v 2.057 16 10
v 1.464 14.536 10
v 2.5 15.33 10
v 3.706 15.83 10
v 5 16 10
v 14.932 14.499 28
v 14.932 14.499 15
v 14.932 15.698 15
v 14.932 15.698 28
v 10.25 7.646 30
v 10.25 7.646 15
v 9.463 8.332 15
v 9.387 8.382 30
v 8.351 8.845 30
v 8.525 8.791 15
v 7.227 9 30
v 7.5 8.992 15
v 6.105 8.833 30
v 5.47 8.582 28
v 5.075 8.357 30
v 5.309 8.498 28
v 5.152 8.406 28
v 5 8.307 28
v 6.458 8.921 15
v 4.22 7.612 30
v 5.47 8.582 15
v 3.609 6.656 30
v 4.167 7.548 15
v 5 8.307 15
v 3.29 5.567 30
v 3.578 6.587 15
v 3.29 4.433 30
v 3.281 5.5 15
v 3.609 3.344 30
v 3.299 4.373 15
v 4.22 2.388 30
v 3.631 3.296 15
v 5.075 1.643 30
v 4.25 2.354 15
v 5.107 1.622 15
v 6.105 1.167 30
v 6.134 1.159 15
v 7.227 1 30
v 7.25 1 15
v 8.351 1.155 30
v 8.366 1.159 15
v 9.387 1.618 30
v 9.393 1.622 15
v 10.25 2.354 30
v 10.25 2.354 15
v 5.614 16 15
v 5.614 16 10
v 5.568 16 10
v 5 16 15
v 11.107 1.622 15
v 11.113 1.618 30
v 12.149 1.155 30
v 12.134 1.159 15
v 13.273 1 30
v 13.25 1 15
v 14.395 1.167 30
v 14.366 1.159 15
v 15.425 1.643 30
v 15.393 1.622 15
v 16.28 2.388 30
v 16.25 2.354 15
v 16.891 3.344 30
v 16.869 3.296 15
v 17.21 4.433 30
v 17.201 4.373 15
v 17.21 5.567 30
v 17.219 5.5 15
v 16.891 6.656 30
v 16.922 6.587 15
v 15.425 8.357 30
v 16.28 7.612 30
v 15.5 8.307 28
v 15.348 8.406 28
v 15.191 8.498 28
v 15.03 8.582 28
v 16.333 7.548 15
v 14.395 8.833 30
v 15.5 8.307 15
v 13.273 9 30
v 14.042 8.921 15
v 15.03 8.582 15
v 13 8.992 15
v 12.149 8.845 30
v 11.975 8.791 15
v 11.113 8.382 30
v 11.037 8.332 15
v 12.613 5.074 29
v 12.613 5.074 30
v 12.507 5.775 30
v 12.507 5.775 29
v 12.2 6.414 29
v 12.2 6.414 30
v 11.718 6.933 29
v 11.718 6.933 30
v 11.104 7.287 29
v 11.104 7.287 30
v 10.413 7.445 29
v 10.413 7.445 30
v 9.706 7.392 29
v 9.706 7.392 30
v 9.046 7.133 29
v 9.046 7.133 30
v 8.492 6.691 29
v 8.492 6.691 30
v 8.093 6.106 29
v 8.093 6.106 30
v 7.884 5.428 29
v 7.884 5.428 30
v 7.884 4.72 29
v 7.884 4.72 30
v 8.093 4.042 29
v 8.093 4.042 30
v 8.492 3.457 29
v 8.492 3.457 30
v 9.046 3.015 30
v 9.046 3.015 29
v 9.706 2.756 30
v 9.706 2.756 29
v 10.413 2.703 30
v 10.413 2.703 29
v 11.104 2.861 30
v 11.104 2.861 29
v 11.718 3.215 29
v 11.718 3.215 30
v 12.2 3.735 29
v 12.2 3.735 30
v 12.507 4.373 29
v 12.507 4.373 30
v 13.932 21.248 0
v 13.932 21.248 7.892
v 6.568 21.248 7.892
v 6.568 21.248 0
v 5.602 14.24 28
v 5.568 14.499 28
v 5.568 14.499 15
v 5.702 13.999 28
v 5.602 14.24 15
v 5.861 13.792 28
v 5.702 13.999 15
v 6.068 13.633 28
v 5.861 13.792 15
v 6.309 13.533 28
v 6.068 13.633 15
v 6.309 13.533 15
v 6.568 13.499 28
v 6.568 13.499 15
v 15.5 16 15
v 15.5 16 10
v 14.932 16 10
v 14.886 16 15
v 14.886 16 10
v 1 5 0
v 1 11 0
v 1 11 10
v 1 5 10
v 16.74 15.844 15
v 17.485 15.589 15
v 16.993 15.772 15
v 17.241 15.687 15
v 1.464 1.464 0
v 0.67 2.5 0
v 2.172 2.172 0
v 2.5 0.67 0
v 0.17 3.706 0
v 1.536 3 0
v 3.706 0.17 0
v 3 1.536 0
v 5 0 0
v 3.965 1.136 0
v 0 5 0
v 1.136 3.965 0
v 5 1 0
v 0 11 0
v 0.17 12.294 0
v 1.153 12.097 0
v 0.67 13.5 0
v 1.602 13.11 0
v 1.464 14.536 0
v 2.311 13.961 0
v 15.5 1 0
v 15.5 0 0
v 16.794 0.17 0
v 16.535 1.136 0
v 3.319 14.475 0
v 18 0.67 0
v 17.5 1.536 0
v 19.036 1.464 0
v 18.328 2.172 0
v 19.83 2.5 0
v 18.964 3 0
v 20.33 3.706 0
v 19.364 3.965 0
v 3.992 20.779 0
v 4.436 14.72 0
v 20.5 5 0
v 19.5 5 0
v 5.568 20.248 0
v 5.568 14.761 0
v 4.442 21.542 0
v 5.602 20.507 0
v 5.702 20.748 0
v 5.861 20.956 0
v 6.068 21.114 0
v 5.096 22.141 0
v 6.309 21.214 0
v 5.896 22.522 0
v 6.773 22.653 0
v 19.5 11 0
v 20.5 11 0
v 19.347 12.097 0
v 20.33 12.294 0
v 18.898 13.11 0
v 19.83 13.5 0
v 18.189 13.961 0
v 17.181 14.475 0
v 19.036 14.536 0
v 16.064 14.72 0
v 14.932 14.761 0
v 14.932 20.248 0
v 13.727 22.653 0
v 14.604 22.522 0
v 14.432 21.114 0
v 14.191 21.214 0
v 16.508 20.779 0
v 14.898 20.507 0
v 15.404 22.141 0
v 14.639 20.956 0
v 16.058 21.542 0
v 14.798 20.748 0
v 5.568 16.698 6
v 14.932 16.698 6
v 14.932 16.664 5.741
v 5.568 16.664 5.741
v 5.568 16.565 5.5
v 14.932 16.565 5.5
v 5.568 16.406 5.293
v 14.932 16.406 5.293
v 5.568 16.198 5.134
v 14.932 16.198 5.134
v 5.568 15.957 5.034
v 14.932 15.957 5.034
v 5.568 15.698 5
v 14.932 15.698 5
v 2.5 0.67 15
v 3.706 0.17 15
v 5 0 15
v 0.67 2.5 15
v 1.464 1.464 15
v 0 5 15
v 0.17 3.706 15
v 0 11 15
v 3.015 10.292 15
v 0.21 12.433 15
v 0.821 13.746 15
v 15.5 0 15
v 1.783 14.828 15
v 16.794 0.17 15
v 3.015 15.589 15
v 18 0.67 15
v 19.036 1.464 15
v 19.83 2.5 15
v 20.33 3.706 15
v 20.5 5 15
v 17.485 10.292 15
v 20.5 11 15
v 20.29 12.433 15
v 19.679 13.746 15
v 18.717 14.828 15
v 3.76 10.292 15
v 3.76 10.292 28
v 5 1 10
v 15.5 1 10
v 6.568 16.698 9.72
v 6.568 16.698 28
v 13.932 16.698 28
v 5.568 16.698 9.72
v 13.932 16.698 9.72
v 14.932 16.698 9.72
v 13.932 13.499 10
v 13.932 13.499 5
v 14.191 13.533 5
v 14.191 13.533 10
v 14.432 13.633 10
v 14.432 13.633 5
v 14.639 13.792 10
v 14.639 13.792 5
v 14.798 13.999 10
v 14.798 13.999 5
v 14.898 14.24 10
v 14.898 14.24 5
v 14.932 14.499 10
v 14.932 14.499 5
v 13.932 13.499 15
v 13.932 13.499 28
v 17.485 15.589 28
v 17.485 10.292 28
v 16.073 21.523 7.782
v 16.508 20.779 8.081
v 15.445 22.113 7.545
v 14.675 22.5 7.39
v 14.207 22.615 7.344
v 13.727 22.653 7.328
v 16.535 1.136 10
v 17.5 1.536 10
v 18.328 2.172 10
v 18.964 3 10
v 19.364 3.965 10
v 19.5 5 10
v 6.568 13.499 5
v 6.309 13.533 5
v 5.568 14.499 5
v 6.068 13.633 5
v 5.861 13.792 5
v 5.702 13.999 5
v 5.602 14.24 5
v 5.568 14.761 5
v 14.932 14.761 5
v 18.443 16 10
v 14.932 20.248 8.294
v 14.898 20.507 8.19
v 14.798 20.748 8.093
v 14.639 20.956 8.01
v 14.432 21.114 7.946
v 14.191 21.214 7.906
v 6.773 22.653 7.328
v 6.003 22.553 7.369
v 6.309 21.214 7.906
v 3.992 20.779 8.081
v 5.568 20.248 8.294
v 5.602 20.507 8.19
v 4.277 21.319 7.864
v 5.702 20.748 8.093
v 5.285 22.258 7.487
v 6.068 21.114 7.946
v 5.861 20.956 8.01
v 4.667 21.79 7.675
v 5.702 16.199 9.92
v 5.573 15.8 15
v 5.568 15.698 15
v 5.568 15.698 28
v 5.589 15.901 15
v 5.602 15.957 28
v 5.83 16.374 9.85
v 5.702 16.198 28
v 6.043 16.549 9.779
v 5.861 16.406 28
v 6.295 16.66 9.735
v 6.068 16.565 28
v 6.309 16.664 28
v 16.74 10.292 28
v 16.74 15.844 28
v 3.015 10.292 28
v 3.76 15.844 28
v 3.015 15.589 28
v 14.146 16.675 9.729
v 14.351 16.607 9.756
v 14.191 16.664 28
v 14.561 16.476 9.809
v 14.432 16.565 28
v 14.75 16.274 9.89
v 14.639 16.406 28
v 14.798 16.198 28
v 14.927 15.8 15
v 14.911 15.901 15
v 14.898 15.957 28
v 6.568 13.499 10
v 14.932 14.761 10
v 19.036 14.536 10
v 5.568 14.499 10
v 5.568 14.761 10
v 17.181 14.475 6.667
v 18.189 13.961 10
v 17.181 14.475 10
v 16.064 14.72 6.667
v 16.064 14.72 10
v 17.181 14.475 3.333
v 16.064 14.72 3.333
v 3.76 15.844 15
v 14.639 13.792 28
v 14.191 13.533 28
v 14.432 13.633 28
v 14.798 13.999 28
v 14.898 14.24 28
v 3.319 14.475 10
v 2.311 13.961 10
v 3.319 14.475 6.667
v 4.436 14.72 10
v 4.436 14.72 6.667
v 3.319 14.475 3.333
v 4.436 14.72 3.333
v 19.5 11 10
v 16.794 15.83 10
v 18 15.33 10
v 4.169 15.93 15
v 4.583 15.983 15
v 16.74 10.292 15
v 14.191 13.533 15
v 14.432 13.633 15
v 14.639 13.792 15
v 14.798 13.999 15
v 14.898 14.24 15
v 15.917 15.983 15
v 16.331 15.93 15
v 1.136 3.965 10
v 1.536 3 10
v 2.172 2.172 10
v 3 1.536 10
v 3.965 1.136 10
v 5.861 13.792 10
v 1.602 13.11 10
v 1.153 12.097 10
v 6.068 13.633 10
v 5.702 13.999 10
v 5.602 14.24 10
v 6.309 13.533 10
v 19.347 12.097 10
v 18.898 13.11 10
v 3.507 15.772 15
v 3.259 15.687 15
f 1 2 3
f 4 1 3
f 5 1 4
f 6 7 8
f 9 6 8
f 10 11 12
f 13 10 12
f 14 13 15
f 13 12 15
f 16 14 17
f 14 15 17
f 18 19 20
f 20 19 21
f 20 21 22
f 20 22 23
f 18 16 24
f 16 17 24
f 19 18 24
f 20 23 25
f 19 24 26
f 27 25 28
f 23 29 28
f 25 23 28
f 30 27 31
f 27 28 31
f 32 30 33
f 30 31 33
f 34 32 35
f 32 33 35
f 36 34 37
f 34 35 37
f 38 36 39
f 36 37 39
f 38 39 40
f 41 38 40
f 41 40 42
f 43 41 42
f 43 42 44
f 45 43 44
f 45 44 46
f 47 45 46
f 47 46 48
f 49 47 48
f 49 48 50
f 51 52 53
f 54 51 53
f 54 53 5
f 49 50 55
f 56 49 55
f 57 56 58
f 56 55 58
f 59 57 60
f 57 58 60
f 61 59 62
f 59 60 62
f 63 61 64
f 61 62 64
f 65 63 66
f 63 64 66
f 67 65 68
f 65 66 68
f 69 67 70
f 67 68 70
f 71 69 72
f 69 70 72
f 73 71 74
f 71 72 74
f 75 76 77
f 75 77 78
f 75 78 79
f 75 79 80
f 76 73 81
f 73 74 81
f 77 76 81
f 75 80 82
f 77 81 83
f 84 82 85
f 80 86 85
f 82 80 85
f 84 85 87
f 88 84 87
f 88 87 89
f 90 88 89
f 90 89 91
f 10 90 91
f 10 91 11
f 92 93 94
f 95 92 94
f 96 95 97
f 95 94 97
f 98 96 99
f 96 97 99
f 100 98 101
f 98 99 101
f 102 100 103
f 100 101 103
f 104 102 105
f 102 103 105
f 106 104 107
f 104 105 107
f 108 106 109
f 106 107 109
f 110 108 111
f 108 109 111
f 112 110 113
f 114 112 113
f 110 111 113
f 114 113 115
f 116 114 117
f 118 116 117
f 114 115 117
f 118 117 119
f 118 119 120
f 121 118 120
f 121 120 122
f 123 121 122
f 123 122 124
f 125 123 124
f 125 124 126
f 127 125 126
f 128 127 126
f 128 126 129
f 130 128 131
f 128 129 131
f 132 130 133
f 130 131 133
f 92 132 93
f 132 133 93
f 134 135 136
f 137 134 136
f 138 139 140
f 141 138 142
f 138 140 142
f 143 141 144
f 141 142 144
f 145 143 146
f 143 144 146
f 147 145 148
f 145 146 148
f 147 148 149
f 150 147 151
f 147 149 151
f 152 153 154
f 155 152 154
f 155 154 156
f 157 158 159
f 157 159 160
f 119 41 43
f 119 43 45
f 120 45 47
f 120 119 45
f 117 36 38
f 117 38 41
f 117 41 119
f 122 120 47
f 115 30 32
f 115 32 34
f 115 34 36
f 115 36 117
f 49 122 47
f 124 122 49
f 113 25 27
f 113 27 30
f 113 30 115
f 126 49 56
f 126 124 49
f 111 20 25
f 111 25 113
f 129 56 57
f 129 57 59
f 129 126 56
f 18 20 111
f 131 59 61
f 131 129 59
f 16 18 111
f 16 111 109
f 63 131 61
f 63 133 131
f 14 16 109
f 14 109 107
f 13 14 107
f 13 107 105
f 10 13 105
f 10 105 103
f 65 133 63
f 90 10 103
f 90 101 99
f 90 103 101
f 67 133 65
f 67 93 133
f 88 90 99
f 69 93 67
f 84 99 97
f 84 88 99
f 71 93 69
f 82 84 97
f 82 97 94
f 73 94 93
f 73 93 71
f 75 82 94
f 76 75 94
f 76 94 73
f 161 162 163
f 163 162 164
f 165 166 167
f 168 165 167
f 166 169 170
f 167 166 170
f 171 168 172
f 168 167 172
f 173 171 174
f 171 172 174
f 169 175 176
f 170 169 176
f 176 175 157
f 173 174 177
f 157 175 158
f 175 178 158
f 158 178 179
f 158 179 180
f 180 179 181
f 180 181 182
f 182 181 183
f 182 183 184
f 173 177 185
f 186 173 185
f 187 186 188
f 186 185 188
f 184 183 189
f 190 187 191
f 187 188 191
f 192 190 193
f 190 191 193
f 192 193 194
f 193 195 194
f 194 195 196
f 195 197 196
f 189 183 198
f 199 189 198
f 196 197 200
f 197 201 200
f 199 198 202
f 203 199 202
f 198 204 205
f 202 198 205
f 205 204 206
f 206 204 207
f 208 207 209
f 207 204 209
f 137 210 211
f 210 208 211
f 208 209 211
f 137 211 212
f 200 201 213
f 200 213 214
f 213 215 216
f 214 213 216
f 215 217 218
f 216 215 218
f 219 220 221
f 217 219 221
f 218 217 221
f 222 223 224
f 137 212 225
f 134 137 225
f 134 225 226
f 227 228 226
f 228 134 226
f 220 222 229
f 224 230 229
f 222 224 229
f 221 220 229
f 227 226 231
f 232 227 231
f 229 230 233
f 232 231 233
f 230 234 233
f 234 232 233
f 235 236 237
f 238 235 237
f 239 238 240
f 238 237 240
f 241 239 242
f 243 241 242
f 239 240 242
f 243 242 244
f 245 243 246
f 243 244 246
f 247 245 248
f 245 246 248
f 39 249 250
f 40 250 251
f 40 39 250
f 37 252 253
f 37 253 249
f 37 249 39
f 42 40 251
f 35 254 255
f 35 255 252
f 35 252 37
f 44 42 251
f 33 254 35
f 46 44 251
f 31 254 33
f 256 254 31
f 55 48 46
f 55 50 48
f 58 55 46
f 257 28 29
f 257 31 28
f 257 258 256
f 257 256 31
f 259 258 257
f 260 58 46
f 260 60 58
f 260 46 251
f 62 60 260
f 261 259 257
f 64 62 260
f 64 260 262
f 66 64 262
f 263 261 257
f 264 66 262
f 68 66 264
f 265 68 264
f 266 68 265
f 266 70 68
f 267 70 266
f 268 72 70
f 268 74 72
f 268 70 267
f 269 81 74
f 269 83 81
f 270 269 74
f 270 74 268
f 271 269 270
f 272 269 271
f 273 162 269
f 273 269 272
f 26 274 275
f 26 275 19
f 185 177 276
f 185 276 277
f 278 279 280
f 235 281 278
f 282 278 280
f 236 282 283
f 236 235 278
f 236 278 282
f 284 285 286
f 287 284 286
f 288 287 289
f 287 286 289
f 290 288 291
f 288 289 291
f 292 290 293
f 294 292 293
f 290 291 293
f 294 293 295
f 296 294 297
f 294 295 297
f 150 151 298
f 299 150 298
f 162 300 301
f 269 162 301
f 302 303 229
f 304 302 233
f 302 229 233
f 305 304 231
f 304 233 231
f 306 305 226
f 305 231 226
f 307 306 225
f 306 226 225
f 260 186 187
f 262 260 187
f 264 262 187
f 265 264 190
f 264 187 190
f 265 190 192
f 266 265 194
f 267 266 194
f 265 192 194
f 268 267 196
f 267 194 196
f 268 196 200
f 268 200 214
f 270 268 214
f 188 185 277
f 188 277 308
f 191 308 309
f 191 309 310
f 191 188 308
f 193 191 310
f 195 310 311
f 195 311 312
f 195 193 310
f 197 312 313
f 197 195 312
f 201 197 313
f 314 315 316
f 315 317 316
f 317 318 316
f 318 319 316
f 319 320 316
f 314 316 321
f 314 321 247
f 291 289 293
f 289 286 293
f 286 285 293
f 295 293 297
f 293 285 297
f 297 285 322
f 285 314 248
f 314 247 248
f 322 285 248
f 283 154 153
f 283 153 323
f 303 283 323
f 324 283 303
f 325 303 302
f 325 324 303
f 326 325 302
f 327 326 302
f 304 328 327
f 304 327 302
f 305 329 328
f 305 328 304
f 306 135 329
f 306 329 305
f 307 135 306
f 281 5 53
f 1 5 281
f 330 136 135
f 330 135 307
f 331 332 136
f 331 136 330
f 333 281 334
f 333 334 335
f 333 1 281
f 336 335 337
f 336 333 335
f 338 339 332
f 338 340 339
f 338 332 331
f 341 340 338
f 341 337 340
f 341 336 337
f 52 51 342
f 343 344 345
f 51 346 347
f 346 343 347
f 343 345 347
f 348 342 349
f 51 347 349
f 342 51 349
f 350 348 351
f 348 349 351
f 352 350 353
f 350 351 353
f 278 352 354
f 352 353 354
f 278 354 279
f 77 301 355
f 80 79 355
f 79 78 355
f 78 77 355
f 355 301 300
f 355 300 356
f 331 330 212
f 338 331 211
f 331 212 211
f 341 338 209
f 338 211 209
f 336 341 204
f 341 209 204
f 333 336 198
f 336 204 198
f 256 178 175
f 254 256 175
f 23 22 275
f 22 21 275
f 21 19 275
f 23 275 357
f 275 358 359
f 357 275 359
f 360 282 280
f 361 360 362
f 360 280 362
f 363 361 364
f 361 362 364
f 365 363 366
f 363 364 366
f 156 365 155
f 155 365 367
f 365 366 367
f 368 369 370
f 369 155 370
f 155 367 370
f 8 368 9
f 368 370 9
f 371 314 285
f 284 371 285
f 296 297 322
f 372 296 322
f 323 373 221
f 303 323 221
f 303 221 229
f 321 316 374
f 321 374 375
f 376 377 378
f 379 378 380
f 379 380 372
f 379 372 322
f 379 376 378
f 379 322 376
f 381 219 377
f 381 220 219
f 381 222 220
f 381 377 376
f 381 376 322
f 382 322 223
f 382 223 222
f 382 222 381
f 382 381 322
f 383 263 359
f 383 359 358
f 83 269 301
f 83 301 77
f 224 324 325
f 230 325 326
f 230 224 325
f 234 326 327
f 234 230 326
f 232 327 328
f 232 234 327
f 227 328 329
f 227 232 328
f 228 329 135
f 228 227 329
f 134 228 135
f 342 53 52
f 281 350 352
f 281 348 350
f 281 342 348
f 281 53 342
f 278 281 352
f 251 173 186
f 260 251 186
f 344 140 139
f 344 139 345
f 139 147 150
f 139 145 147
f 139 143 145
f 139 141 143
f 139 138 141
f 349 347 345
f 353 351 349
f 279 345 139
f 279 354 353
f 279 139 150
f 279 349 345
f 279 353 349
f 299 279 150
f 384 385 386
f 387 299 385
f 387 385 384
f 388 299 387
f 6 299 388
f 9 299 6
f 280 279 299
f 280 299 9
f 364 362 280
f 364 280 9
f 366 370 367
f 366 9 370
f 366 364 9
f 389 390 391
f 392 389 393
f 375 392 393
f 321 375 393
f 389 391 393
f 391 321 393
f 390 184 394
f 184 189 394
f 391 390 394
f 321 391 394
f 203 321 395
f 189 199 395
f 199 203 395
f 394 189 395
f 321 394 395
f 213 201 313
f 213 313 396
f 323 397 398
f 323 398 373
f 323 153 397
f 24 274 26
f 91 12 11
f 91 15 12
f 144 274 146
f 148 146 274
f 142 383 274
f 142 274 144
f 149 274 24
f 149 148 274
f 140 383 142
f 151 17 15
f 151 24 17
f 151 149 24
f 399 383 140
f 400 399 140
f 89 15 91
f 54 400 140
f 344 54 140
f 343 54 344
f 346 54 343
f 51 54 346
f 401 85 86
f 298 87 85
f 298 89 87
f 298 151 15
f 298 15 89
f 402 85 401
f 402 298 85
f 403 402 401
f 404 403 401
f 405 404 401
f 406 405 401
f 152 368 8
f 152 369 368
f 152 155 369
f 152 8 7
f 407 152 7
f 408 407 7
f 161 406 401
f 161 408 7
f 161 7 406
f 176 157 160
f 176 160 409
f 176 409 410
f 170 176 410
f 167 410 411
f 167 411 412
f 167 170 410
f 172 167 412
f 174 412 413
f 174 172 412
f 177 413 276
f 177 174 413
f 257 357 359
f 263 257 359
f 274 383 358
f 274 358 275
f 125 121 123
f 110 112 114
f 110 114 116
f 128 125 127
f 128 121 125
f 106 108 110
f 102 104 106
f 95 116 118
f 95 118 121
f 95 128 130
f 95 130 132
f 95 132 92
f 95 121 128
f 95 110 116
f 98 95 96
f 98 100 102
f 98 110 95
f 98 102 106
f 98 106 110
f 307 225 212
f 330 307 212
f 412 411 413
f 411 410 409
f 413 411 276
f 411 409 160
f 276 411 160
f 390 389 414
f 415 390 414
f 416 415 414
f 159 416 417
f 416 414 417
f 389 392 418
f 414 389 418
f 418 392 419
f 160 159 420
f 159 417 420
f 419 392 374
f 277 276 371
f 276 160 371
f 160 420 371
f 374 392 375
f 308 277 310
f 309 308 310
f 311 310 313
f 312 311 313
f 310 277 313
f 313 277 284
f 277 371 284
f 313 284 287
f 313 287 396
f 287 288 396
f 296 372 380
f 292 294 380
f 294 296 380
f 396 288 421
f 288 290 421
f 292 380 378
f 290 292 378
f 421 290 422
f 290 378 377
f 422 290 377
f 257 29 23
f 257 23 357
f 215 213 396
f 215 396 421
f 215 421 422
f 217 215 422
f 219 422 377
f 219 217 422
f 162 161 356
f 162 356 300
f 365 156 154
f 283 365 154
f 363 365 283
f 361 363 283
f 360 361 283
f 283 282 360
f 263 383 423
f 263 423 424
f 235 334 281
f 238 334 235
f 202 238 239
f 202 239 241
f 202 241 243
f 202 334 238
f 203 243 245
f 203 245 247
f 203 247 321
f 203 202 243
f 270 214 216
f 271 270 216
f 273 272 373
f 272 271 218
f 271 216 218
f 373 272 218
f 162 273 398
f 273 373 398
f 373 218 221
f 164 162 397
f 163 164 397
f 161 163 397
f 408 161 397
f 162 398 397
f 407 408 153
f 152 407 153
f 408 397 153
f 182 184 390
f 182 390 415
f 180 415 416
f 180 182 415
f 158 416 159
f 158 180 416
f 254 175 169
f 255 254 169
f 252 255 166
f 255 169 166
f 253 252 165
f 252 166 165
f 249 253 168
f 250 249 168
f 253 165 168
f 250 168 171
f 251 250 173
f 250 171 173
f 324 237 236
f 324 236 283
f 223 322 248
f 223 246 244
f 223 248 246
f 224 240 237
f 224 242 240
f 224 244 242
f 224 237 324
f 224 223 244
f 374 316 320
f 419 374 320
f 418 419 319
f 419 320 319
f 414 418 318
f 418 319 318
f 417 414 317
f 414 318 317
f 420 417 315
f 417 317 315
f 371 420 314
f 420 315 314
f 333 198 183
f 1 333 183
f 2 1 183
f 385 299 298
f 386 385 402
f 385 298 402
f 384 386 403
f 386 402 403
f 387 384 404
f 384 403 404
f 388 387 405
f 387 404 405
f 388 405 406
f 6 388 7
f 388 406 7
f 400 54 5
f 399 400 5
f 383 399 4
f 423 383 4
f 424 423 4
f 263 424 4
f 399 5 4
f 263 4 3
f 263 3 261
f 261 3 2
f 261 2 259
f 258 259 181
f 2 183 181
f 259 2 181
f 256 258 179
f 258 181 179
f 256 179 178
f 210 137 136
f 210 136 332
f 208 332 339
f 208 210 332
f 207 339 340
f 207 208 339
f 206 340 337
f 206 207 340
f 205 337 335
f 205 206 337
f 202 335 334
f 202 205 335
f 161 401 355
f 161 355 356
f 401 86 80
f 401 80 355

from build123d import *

# Parameters (mm, degrees)
EXTRUDE_1_DEPTH      = 15
EXTRUDE_2_DEPTH      = 15
EXTRUDE_3_DEPTH      = 13
EXTRUDE_4_DEPTH      = 10
CUT_EXTRUDE_2_DEPTH  = 43.818428432
CUT_EXTRUDE_3_DEPTH  = 10
EXTRUDE_5_DEPTH      = 13
EXTRUDE_5_DEPTH_BACK = 10
SKETCH_7_W           = 9.36410038
SKETCH_7_H           = 3.199645584
FILLET_1_R           = 1
SKETCH_8_R           = 2.377718278
CUT_EXTRUDE_4_DEPTH  = 1


with BuildPart() as part:
    # ｽｹｯﾁ1 → ﾎﾞｽ - 押し出し1 (new body)
    with BuildSketch(Plane.XY):
        with BuildLine():
            Line((5, 0), (15.5, 0))
            ThreePointArc((15.5, 0), (19.035533906, 1.464466094), (20.5, 5))
            Line((20.5, 5), (20.5, 11))
            ThreePointArc((20.5, 11), (19.035533906, 14.535533906), (15.5, 16))
            Line((15.5, 16), (5, 16))
            ThreePointArc((5, 16), (1.464466094, 14.535533906), (0, 11))
            Line((0, 11), (0, 5))
            ThreePointArc((0, 5), (1.464466094, 1.464466094), (5, 0))
        make_face()
    extrude(amount=EXTRUDE_1_DEPTH)

    # ｽｹｯﾁ2 → ﾎﾞｽ - 押し出し2 (add)
    with BuildSketch(Plane.XY.offset(15)):
        with BuildLine():
            ThreePointArc((10.25, 7.645751311), (3.25, 5), (10.25, 2.354248689))
            ThreePointArc((10.25, 2.354248689), (17.25, 5), (10.25, 7.645751311))
        make_face()
    extrude(amount=EXTRUDE_2_DEPTH)

    # ｽｹｯﾁ3 → ﾎﾞｽ - 押し出し3 (add)
    with BuildSketch(Plane.XY.offset(15)):
        Polygon((5, 8.307189139), (3.015149344, 10.292039795), (3.015149344, 15.589157643), (3.760031936, 15.843808337), (3.760031936, 10.292039795), (5.469966234, 8.582105497), align=None)
        Polygon((15.5, 8.307189139), (15.030033766, 8.582105497), (16.739968064, 10.292039795), (16.739968064, 15.843808337), (17.484850656, 15.589157643), (17.484850656, 10.292039795), align=None)
    extrude(amount=EXTRUDE_3_DEPTH)

    # ｽｹｯﾁ4 → ﾎﾞｽ - 押し出し4 (add)
    with BuildSketch(Plane(origin=(0, 0, 0), x_dir=(-1, 0, 0), z_dir=(0, 0, -1))):
        with BuildLine():
            Line((-19.035533906, 14.535533906), (-16.508167917, 20.778897002))
            ThreePointArc((-16.508167917, 20.778897002), (-15.404115105, 22.140884029), (-13.727372471, 22.653207574))
            Line((-13.727372471, 22.653207574), (-6.772627529, 22.653207574))
            ThreePointArc((-6.772627529, 22.653207574), (-5.095884895, 22.140884029), (-3.991832083, 20.778897002))
            Line((-3.991832083, 20.778897002), (-1.464466094, 14.535533906))
            Line((-1.464466094, 14.535533906), (-19.035533906, 14.535533906))
        make_face()
    extrude(amount=-EXTRUDE_4_DEPTH)

    # ｽｹｯﾁ5 → ｶｯﾄ - 押し出し2 (cut, through all)
    with BuildSketch(Plane(origin=(0, 0, 0), x_dir=(0, 0, -1), z_dir=(1, 0, 0))):
        Polygon((-10, 16), (-7.328208582, 22.653207574), (-10, 22.653207574), align=None)
    extrude(amount=CUT_EXTRUDE_2_DEPTH, mode=Mode.SUBTRACT)

    # ｽｹｯﾁ6 → ｶｯﾄ - 押し出し3 (cut)
    with BuildSketch(Plane(origin=(0, 0, 0), x_dir=(-1, 0, 0), z_dir=(0, 0, -1))):
        with BuildLine():
            Line((-14.93205019, 14.761085745), (-14.93205019, 20.248440553))
            ThreePointArc((-14.93205019, 20.248440553), (-14.639156971, 20.955547334), (-13.93205019, 21.248440553))
            Line((-13.93205019, 21.248440553), (-6.56794981, 21.248440553))
            ThreePointArc((-6.56794981, 21.248440553), (-5.860843029, 20.955547334), (-5.56794981, 20.248440553))
            Line((-5.56794981, 20.248440553), (-5.56794981, 14.761085745))
            add(Edge.make_bspline(
                [(-2.310743979, 13.961064345), (-3.233908529, 14.632656192), (-4.458845113, 14.799104366), (-5.56794981, 14.761085745)],
                knots=[0, 0, 0, 0, 1, 1, 1, 1], degree=3))
            ThreePointArc((-2.310743979, 13.961064345), (-1.342335165, 12.619100972), (-1, 11))
            Line((-1, 11), (-1, 5))
            ThreePointArc((-1, 5), (-2.171572875, 2.171572875), (-5, 1))
            Line((-5, 1), (-15.5, 1))
            ThreePointArc((-15.5, 1), (-18.328427125, 2.171572875), (-19.5, 5))
            Line((-19.5, 5), (-19.5, 11))
            ThreePointArc((-19.5, 11), (-19.157664835, 12.619100972), (-18.189256021, 13.961064345))
            add(Edge.make_bspline(
                [(-18.189256021, 13.961064345), (-17.266091471, 14.632656192), (-16.041154887, 14.799104366), (-14.93205019, 14.761085745)],
                knots=[0, 0, 0, 0, 1, 1, 1, 1], degree=3))
        make_face()
    extrude(amount=-CUT_EXTRUDE_3_DEPTH, mode=Mode.SUBTRACT)

    # ｽｹｯﾁ7 → ﾎﾞｽ - 押し出し5 (add, two sides: drawn at the far end of the back side and taken through both)
    with BuildSketch(Plane.XY.offset(15).offset(-EXTRUDE_5_DEPTH_BACK)):
        with Locations((10.25, 15.098663031)):
            Rectangle(SKETCH_7_W, SKETCH_7_H)
    extrude(amount=EXTRUDE_5_DEPTH + EXTRUDE_5_DEPTH_BACK)

    # ﾌｨﾚｯﾄ1
    # the kernel refuses this fillet: 1 mm, written as the material it takes off along each edge
    with BuildSketch(Plane(origin=(14.93205019, 16.698485823, 5), x_dir=(0, 0, 1), z_dir=(-1, 0, 0))) as fillet_1_piece_1:
        with BuildLine():
            CenterArc((FILLET_1_R, -FILLET_1_R), FILLET_1_R, 90, 90)
            Line((0, -FILLET_1_R), (0, 0))
            Line((0, 0), (FILLET_1_R, 0))
        make_face()
    extrude(amount=9.36410038, mode=Mode.SUBTRACT)
    with BuildSketch(Plane(origin=(14.93205019, 13.498840239, 2.5), x_dir=(0, 1, 0), z_dir=(0, 0, 1))) as fillet_1_piece_2:
        with BuildLine():
            CenterArc((FILLET_1_R, FILLET_1_R), FILLET_1_R, 180, 90)
            Line((0, FILLET_1_R), (0, 0))
            Line((0, 0), (FILLET_1_R, 0))
        make_face()
    extrude(amount=7.5, mode=Mode.SUBTRACT)
    with BuildSketch(Plane(origin=(5.56794981, 13.498840239, 2.5), x_dir=(0, 1, 0), z_dir=(0, 0, 1))) as fillet_1_piece_3:
        with BuildLine():
            CenterArc((FILLET_1_R, -FILLET_1_R), FILLET_1_R, 90, 90)
            Line((0, -FILLET_1_R), (0, 0))
            Line((0, 0), (FILLET_1_R, 0))
        make_face()
    extrude(amount=7.5, mode=Mode.SUBTRACT)
    with BuildSketch(Plane(origin=(5.56794981, 13.498840239, 15), x_dir=(0, 1, 0), z_dir=(0, 0, 1)), Plane(origin=(14.93205019, 13.498840239, 15), x_dir=(-1, 0, 0), z_dir=(0, 0, 1))) as fillet_1_piece_4:
        with BuildLine():
            CenterArc((FILLET_1_R, -FILLET_1_R), FILLET_1_R, 90, 90)
            Line((0, -FILLET_1_R), (0, 0))
            Line((0, 0), (FILLET_1_R, 0))
        make_face()
    extrude(amount=15.5, mode=Mode.SUBTRACT)
    with BuildSketch(Plane(origin=(14.93205019, 16.698485823, 30.5), x_dir=(0, -1, 0), z_dir=(0, 0, -1))) as fillet_1_piece_5_section:
        with BuildLine():
            CenterArc((FILLET_1_R, FILLET_1_R), FILLET_1_R, 180, 90)
            Line((0, FILLET_1_R), (0, 0))
            Line((0, 0), (FILLET_1_R, 0))
        make_face()
    fillet_1_piece_5 = extrude(amount=23.280497551, mode=Mode.PRIVATE)
    fillet_1_piece_5 = split(fillet_1_piece_5, bisect_by=Plane(origin=(14.918146213, 15.92497671, 15), z_dir=(0, 0, 1)), keep=Keep.TOP, mode=Mode.PRIVATE)
    add(fillet_1_piece_5, mode=Mode.SUBTRACT)
    with BuildSketch(Plane(origin=(14.93205019, 16.698485823, 30.5), x_dir=(0, -1, 0), z_dir=(0, 0, -1))) as fillet_1_piece_6_section:
        with BuildLine():
            CenterArc((FILLET_1_R, FILLET_1_R), FILLET_1_R, 180, 90)
            Line((0, FILLET_1_R), (0, 0))
            Line((0, 0), (FILLET_1_R, 0))
        make_face()
    fillet_1_piece_6 = extrude(amount=23.280497551, mode=Mode.PRIVATE)
    fillet_1_piece_6 = split(fillet_1_piece_6, bisect_by=Plane(origin=(14.70262804, 15.590982586, 10.164252987), z_dir=(0, 0.3726538497201509, 0.927970424253247)), keep=Keep.TOP, mode=Mode.PRIVATE)
    fillet_1_piece_6 = split(fillet_1_piece_6, bisect_by=Plane(origin=(14.70262804, 16, 12.401713298), z_dir=(0, 1, 0)), keep=Keep.TOP, mode=Mode.PRIVATE)
    add(fillet_1_piece_6, mode=Mode.SUBTRACT)
    with BuildSketch(Plane(origin=(5.56794981, 16.698485823, 30.5), x_dir=(0, -1, 0), z_dir=(0, 0, -1))) as fillet_1_piece_7_section:
        with BuildLine():
            CenterArc((FILLET_1_R, -FILLET_1_R), FILLET_1_R, 90, 90)
            Line((0, -FILLET_1_R), (0, 0))
            Line((0, 0), (FILLET_1_R, 0))
        make_face()
    fillet_1_piece_7 = extrude(amount=23.280497551, mode=Mode.PRIVATE)
    fillet_1_piece_7 = split(fillet_1_piece_7, bisect_by=Plane(origin=(5.581853787, 15.92497671, 15), z_dir=(0, 0, 1)), keep=Keep.TOP, mode=Mode.PRIVATE)
    add(fillet_1_piece_7, mode=Mode.SUBTRACT)
    with BuildSketch(Plane(origin=(5.56794981, 16.698485823, 30.5), x_dir=(0, -1, 0), z_dir=(0, 0, -1))) as fillet_1_piece_8_section:
        with BuildLine():
            CenterArc((FILLET_1_R, -FILLET_1_R), FILLET_1_R, 90, 90)
            Line((0, -FILLET_1_R), (0, 0))
            Line((0, 0), (FILLET_1_R, 0))
        make_face()
    fillet_1_piece_8 = extrude(amount=23.280497551, mode=Mode.PRIVATE)
    fillet_1_piece_8 = split(fillet_1_piece_8, bisect_by=Plane(origin=(5.79737196, 16, 12.401713298), z_dir=(0, 1, 0)), keep=Keep.TOP, mode=Mode.PRIVATE)
    fillet_1_piece_8 = split(fillet_1_piece_8, bisect_by=Plane(origin=(5.79737196, 15.590982586, 10.164252987), z_dir=(0, 0.3726538497201509, 0.927970424253247)), keep=Keep.TOP, mode=Mode.PRIVATE)
    add(fillet_1_piece_8, mode=Mode.SUBTRACT)

    # ｽｹｯﾁ8 → ｶｯﾄ - 押し出し4 (cut)
    with BuildSketch(Plane.XY.offset(30)):
        with Locations((10.235322727, 5.074085352)):
            Circle(SKETCH_8_R)
    extrude(amount=-CUT_EXTRUDE_4_DEPTH, mode=Mode.SUBTRACT)


solid = part.part
